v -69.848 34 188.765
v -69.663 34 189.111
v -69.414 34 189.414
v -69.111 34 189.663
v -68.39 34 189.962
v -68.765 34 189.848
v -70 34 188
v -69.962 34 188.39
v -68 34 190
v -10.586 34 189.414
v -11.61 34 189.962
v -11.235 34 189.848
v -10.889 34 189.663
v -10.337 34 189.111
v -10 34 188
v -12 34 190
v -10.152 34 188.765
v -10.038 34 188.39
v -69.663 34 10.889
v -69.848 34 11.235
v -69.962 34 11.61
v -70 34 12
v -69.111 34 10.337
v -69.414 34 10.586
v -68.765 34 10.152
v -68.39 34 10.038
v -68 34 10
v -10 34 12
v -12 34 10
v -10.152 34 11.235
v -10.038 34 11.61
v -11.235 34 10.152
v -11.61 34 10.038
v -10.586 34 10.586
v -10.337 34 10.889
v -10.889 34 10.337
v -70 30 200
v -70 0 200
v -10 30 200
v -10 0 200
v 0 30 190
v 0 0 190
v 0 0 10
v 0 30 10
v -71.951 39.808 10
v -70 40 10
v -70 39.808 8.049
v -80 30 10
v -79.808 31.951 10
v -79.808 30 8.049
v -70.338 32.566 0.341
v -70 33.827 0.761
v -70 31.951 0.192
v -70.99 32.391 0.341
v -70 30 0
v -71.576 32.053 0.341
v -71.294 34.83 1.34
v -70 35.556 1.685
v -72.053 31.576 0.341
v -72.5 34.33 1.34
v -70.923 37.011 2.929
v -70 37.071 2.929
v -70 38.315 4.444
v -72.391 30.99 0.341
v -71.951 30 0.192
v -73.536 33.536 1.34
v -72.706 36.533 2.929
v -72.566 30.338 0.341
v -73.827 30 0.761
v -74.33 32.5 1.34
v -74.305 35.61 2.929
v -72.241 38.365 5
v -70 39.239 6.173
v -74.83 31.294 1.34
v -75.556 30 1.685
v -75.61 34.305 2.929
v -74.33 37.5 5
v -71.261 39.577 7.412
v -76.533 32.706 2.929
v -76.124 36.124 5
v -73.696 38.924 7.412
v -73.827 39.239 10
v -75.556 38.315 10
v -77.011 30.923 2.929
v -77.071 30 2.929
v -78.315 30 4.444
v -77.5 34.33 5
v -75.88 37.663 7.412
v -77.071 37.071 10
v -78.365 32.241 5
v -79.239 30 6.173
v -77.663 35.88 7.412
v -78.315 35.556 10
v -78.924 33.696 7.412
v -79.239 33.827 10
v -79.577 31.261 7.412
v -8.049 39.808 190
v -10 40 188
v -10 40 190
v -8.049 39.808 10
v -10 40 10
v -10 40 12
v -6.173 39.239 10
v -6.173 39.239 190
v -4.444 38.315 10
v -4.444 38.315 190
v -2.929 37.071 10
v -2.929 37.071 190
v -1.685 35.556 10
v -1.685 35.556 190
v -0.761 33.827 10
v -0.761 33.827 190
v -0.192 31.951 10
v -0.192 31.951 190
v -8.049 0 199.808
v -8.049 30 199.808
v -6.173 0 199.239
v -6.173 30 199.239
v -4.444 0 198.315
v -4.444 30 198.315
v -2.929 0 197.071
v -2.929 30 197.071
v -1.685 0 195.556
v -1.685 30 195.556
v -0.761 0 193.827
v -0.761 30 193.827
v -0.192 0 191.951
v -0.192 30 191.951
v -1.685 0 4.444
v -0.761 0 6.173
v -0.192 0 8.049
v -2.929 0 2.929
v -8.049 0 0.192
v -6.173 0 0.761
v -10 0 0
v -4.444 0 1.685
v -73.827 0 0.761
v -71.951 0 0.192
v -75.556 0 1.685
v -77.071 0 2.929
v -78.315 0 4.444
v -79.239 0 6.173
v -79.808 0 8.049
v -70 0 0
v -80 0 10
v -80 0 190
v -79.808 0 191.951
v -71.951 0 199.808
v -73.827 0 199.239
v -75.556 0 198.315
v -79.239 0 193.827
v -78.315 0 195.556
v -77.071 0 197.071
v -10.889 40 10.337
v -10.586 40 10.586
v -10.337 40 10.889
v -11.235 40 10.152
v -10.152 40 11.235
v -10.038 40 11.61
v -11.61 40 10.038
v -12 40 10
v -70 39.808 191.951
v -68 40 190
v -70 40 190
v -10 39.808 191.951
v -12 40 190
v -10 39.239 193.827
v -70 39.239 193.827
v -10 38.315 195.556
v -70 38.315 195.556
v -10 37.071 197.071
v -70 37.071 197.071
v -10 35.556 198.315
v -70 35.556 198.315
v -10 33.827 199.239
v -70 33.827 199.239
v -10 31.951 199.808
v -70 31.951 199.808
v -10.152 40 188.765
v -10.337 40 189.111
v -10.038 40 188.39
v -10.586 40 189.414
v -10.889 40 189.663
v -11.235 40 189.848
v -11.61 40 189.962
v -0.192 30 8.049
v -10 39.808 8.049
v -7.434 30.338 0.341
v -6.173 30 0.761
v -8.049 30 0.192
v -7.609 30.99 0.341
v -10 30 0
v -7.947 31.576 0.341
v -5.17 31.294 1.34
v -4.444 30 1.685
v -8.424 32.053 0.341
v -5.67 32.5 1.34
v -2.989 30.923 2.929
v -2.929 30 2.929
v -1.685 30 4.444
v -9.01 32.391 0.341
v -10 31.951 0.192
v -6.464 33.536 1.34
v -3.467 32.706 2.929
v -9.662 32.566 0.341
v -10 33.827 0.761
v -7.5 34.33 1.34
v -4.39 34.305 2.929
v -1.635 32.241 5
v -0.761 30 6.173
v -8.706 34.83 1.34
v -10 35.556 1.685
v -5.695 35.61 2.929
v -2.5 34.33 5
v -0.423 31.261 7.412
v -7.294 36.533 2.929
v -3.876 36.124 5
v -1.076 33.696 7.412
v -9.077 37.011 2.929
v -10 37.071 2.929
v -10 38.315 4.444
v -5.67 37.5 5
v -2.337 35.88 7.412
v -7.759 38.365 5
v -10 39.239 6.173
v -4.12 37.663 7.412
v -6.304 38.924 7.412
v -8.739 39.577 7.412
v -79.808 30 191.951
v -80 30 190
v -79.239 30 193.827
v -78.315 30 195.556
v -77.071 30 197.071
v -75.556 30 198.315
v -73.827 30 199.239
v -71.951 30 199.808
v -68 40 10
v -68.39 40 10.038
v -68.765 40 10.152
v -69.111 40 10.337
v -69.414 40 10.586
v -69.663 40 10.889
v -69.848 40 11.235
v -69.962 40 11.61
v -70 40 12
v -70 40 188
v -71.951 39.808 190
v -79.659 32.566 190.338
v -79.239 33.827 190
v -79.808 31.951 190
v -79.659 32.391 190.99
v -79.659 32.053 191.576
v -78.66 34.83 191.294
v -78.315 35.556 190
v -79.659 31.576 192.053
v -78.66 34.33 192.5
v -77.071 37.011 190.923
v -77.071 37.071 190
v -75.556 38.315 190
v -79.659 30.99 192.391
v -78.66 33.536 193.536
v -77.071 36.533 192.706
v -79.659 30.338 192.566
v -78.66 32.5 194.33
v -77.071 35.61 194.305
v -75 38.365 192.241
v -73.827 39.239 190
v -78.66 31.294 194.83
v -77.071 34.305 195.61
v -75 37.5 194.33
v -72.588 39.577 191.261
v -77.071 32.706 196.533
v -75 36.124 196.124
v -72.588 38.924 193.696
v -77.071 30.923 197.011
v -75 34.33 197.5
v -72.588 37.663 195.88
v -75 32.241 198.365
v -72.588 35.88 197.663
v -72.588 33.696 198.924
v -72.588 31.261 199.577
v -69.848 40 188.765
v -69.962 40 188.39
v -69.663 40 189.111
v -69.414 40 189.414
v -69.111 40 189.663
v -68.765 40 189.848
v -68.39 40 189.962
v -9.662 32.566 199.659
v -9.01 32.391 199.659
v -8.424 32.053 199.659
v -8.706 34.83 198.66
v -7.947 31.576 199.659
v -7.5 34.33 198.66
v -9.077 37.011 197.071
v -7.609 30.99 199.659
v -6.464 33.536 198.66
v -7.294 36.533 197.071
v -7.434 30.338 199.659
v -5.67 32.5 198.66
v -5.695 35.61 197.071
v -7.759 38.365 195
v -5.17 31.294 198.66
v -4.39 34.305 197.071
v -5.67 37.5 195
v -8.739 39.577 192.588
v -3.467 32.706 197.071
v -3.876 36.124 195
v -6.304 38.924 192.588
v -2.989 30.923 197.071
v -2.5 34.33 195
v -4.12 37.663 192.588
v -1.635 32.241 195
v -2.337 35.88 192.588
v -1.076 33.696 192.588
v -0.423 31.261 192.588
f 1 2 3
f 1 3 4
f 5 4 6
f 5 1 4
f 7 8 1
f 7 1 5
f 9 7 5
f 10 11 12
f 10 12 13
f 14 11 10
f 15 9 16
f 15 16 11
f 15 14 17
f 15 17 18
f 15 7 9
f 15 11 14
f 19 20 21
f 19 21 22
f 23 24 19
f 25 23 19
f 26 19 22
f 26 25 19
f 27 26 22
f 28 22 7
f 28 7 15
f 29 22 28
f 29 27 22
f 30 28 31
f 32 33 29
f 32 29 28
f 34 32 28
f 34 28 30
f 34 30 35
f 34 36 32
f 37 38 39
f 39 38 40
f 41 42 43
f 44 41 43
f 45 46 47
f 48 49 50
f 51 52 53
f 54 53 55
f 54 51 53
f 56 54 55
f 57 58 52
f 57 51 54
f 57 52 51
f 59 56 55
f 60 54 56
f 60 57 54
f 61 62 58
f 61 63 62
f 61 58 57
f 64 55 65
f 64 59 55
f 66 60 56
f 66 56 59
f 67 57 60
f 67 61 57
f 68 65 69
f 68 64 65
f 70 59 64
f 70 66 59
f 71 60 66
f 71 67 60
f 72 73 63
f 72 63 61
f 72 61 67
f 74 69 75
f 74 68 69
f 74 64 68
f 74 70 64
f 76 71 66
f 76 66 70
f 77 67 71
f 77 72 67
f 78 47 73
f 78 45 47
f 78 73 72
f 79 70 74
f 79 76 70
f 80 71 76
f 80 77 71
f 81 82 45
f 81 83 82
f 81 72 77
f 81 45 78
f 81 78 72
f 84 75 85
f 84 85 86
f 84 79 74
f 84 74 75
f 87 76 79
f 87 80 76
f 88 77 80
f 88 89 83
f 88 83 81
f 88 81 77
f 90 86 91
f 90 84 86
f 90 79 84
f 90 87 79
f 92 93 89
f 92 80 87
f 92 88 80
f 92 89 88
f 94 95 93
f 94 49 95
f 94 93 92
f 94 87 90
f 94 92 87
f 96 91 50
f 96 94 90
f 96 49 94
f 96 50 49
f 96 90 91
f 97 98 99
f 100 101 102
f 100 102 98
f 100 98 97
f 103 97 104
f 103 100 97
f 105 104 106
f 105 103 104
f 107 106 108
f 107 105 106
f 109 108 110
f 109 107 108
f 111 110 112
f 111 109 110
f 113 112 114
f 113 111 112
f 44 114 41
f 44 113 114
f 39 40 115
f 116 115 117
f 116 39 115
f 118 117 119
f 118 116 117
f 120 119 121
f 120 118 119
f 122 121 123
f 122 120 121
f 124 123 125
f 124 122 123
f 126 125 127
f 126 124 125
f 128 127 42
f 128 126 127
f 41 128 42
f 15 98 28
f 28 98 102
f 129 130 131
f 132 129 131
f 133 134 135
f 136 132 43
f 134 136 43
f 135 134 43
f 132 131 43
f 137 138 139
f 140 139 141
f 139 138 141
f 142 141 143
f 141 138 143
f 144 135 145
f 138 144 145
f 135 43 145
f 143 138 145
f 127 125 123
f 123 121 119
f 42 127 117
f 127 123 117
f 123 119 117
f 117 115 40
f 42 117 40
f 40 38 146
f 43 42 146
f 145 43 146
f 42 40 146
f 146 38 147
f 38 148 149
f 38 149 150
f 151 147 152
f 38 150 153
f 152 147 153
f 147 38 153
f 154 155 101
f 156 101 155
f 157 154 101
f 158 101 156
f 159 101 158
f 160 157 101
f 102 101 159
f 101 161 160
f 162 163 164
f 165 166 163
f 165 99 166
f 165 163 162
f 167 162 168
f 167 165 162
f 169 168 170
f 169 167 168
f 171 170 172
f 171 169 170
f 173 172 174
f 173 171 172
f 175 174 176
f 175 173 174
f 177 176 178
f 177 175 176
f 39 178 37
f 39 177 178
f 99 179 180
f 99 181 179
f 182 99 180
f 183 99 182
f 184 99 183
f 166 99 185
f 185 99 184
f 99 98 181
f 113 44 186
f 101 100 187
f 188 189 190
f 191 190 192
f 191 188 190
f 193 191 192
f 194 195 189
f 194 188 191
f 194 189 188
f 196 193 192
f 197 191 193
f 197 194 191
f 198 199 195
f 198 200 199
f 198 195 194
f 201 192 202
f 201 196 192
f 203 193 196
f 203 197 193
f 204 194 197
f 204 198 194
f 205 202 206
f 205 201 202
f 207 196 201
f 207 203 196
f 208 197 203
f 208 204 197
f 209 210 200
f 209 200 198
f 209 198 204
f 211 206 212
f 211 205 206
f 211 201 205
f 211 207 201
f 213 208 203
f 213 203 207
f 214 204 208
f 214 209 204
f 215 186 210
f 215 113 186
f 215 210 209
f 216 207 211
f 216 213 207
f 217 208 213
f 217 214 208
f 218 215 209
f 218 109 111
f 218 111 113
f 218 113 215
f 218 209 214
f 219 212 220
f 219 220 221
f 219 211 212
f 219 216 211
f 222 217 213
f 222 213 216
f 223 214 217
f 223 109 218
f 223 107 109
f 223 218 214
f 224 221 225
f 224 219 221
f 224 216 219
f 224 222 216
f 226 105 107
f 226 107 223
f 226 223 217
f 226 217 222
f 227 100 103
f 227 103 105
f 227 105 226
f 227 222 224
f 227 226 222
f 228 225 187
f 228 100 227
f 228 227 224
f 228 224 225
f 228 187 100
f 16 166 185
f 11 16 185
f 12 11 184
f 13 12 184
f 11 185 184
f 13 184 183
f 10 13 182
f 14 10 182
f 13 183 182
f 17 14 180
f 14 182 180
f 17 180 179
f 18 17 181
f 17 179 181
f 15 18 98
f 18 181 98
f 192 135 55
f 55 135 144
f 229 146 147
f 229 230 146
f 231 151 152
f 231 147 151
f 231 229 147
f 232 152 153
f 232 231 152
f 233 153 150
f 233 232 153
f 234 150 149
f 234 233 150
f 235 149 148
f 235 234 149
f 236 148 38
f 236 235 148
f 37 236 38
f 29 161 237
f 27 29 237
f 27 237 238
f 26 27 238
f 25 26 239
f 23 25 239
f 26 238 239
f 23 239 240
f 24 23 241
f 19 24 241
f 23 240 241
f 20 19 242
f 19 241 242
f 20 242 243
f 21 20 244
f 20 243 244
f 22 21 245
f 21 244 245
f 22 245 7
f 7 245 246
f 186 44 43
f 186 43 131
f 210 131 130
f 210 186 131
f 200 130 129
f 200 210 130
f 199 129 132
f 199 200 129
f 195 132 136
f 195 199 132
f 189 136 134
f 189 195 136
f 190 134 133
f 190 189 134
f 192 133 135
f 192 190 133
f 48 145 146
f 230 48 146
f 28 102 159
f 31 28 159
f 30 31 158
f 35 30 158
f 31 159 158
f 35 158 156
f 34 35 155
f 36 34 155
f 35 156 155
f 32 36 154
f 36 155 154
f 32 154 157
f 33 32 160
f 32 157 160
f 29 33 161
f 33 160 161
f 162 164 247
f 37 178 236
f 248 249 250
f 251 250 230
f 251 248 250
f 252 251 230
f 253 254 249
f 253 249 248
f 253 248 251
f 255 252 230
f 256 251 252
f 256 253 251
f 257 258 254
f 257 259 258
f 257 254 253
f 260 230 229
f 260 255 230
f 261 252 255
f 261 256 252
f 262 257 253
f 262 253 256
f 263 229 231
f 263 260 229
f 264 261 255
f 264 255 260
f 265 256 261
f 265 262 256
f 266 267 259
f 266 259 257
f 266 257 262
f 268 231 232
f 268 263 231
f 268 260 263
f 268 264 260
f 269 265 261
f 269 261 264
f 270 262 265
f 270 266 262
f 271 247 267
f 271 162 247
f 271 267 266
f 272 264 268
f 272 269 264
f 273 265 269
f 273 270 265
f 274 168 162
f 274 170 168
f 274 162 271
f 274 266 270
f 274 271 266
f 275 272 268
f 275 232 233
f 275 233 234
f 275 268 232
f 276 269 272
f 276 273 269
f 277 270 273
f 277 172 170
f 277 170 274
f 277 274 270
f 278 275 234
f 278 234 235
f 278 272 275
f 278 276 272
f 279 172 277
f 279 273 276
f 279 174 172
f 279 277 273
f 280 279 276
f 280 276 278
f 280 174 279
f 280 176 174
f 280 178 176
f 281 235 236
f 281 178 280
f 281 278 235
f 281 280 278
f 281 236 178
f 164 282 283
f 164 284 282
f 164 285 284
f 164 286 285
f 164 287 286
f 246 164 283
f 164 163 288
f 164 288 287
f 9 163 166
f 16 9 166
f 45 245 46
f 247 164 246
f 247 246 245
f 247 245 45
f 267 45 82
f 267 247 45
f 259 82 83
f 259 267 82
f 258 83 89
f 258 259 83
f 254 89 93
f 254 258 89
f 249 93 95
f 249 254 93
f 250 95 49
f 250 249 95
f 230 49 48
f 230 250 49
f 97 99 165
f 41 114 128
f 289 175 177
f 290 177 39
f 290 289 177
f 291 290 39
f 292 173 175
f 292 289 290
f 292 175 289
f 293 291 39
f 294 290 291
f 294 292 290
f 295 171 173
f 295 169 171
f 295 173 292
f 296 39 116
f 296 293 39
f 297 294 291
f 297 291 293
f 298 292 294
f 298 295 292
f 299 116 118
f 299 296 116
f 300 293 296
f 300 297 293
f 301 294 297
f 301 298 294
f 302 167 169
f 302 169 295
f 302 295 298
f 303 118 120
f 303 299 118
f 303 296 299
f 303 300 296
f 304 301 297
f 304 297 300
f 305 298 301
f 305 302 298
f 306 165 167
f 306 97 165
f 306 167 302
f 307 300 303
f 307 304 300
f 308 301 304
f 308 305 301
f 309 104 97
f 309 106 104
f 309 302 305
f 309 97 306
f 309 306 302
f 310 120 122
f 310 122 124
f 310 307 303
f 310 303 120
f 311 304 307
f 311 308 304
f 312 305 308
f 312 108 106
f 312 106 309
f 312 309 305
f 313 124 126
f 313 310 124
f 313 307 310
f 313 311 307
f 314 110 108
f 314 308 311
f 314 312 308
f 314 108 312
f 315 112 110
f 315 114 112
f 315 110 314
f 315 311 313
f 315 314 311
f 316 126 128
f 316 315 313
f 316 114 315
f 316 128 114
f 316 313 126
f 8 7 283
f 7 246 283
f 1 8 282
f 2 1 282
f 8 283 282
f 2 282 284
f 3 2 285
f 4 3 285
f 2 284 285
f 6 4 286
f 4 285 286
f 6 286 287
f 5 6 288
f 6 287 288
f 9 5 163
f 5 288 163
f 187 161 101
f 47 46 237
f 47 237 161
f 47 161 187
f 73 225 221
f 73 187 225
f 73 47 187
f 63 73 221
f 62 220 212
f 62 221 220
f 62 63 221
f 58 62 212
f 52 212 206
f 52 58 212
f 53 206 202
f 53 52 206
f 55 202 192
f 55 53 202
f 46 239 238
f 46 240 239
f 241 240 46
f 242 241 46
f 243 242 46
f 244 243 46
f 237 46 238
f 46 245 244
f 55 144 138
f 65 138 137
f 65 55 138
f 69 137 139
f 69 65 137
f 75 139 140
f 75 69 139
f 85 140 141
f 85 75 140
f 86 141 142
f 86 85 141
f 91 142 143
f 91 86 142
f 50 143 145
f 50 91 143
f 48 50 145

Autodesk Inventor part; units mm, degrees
ref_plane "YZ Plane" through (0, 0, 0) normal (1, 0, 0) x (0, 1, 0)
ref_plane "XZ Plane" through (0, 0, 0) normal (0, 1, 0) x (-1, 0, 0)
ref_plane "XY Plane" through (0, 0, 0) normal (0, 0, 1) x (1, 0, 0)
sketch "Sketch1" plane through (0, 0, 0) normal (0, 1, 0) x (-1, 0, 0)
  line L0 (0, 0) -> (80, 0)
  line L1 (80, 0) -> (80, 200)
  line L2 (80, 200) -> (0, 200)
  line L3 (0, 200) -> (0, 0)
  dimension "d0" = 80
  dimension "d1" = 200
extrude "Extrusion1" add sketch "Sketch1" along normal blind 40
fillet "Fillet1" radius 10 8 edges at (0, 40, 100) (-40, 40, 200) (-80, 40, 100) (-40, 40, 0) (0, 20, 0) (0, 20, 200) (-80, 20, 200) (-80, 20, 0)
sketch "Sketch2" plane through (0, 40, 0) normal (0, 1, 0) x (1, 0, 0)
  line L0 (-68, -190) -> (-12, -190)
  line L1 (-10, -188) -> (-10, -12)
  line L2 (-12, -10) -> (-68, -10)
  line L3 (-70, -12) -> (-70, -188)
  line L4 (-70, -10) -> (-10, -10) projected
  line L5 (-10, -10) -> (-10, -190) projected
  arc A0 (-70, -188) -> (-68, -190) centre (-68, -188) ccw
  arc A1 (-68, -10) -> (-70, -12) centre (-68, -12) ccw
  arc A2 (-10, -12) -> (-12, -10) centre (-12, -12) ccw
  arc A3 (-12, -190) -> (-10, -188) centre (-12, -188) ccw
  point P0 (0, 0)
  point P1 (-70, -100)
  point P2 (-40, -10)
  dimension "d5" = 90
  dimension "d6" = 180
  dimension "d7" = 30
  dimension "d8" = 60
  dimension "d9" = 2
extrude "Extrusion2" cut sketch "Sketch2" against normal blind 6 contours A0 L3 A1 L2 A2 L1 A3 L0
properties part number "lcd screen"
